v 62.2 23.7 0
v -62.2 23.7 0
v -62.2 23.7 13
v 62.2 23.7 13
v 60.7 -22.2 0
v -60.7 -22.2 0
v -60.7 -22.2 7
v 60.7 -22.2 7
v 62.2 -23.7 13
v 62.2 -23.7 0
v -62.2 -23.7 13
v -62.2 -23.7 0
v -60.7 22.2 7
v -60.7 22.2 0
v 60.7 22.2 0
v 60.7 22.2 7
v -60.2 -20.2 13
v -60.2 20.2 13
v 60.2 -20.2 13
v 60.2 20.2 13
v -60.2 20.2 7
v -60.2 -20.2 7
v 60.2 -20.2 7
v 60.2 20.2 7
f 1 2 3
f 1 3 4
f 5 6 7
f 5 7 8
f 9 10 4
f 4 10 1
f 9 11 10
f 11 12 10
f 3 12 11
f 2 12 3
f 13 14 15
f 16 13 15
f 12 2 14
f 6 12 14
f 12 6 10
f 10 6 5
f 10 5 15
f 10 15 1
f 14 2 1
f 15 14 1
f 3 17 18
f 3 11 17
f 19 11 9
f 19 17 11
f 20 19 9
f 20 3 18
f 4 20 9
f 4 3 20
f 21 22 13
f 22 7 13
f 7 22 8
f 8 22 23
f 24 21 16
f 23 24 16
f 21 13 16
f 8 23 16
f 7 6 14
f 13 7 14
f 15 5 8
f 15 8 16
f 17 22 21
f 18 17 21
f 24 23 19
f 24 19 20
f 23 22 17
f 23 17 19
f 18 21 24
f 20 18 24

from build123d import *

# Parameters (mm, degrees)
F0_W     = 124.4
F0_H     = 47.4
F0_W_2   = 121.4
F0_H_2   = 44.4
F1_DEPTH = 7
F2_W     = 124.4
F2_H     = 47.4
F2_W_2   = 121.4
F2_H_2   = 44.4
F2_W_3   = 120.4
F2_H_3   = 40.4
F3_DEPTH = 6


with BuildPart() as f1:
    # F0 (on Top) → F1 (new body)
    with BuildSketch(Plane.XY):
        Rectangle(F0_W, F0_H)
        Rectangle(F0_W_2, F0_H_2, mode=Mode.SUBTRACT)
    extrude(amount=F1_DEPTH)

    # F2 (on face) → F3 (join)
    with BuildSketch(Plane.XY.offset(7)):
        Rectangle(F2_W, F2_H)
        Rectangle(F2_W_2, F2_H_2, mode=Mode.SUBTRACT)
        Rectangle(F2_W_2, F2_H_2)
        Rectangle(F2_W_3, F2_H_3, mode=Mode.SUBTRACT)
    extrude(amount=F3_DEPTH)


solid = f1.part
